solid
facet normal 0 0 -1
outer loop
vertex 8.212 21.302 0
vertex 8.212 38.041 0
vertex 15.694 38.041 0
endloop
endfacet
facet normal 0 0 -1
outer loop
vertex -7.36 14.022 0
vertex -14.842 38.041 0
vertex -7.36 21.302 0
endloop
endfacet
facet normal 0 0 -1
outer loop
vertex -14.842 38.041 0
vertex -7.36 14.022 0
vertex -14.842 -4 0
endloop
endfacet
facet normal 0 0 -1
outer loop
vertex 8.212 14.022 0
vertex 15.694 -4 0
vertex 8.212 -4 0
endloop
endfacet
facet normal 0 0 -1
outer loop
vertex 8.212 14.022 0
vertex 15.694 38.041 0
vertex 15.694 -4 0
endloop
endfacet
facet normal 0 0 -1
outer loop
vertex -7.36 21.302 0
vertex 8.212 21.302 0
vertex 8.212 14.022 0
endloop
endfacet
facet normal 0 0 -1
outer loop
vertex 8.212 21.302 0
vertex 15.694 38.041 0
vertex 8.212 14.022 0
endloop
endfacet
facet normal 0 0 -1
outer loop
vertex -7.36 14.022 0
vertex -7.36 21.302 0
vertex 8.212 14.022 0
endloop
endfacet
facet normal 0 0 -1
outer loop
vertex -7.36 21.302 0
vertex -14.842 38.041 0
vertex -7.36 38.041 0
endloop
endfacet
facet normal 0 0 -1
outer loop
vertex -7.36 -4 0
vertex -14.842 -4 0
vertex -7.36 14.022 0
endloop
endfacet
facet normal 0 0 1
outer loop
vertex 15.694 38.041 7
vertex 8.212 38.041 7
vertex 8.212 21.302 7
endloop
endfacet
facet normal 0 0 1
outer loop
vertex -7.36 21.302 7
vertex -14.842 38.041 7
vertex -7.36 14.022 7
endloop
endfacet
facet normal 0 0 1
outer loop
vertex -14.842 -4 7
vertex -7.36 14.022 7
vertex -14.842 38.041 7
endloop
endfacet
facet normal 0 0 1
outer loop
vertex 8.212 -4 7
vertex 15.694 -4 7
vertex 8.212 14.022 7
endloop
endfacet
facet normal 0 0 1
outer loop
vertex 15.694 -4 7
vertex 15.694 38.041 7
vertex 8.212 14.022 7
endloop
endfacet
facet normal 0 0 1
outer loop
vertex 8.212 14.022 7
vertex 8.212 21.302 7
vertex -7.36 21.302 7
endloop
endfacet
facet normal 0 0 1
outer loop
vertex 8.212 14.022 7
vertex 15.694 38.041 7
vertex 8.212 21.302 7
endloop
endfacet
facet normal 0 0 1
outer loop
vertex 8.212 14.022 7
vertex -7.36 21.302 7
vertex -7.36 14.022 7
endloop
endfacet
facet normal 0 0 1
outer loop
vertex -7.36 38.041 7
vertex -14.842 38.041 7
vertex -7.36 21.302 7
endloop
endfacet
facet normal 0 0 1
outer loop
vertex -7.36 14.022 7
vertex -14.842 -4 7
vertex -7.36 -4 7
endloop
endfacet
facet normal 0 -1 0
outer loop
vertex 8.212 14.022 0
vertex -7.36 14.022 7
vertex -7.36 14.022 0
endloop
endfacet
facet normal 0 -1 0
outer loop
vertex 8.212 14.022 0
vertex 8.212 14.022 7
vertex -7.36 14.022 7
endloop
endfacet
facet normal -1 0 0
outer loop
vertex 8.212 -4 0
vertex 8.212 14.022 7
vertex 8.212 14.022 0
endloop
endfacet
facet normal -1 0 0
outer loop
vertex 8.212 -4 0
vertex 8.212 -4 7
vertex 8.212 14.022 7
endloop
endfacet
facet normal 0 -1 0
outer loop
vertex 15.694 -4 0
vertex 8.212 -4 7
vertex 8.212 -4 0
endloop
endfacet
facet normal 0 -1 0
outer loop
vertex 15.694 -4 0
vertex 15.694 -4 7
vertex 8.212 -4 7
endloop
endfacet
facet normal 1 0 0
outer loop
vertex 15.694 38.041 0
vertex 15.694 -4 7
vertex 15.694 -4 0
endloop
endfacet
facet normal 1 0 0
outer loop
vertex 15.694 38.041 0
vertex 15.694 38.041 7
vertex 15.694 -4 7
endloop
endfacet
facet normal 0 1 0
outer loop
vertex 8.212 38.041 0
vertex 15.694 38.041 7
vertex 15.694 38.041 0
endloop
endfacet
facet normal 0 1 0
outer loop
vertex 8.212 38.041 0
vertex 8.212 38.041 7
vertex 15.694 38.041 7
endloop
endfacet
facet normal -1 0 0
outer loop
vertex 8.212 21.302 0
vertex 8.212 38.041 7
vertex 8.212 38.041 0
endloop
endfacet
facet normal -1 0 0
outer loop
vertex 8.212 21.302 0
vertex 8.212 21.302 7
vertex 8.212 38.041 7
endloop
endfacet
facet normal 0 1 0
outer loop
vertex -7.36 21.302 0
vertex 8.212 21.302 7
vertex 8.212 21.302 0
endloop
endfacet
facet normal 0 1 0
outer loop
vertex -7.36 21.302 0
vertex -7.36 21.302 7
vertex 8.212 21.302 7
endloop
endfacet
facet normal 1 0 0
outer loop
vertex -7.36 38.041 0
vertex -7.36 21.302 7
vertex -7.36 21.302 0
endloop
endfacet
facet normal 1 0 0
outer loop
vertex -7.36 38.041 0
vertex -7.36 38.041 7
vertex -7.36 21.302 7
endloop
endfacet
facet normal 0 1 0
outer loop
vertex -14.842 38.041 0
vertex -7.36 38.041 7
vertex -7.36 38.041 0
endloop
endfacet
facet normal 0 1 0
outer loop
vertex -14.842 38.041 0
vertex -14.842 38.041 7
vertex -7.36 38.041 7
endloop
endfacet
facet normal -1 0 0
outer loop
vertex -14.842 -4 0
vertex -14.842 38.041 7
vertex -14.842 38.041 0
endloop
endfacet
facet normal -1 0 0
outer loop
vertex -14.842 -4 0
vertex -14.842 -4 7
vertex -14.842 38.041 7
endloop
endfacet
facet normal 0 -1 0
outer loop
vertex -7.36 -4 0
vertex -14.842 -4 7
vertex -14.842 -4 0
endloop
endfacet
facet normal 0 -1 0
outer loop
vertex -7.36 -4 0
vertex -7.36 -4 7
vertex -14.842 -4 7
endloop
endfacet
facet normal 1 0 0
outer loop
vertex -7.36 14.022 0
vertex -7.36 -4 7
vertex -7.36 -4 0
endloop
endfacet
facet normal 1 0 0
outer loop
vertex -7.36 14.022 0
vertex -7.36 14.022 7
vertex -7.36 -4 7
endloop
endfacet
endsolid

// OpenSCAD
// file: glyph.scad
// glyph — the shared geometry of every letter in the set. Defines named geometry
// only, so it renders nothing on its own; each letter part includes it and calls
// letter(). Every dimension lives in ../../lib/common.scad.
//
// A LETTER IS NOTHING BUT A LETTER. No plinth, no tongue, no tab — it is the
// bare glyph, and it attaches by standing in the deck groove and resting on the
// groove's floor. Anything else on it would be a distraction on a learning toy.
//
// It is a flat plate of one thickness, printed face-down: no overhang anywhere,
// no supports, and the face on the bed comes out smoothest.
//
// TWO TRAPS WITH text():
//
//  * A missing font FALLS BACK SILENTLY — no warning, no error, just different
//    letters. "Liberation Sans" was the first choice here because OpenSCAD
//    bundles it; on macOS the bundled faces are not registered with fontconfig,
//    so it rendered the fallback face instead and nothing said so. To check a
//    font resolved, render a string with it and with a deliberately bogus name
//    and compare bounding boxes: identical means it fell back.
//  * `size` is not the cap height in general. For Helvetica Bold they coincide
//    (size 44 -> 44.0 mm cap), which is why letter_size reads as a height.
//    Change the font and re-measure.

include <../../lib/common.scad>

// The letter's outline, upright in the XY plane, ready to be extruded along Z
// (which is the letter's thickness, and the print's build axis).
//
//   y = 0   is the deck surface
//   y < 0   is the part standing down inside the groove. It reaches letter_bury,
//           which is where the tapered groove closes to letter_t — NOT the
//           groove's floor. The letter wedges; it never bottoms out.
module glyph_2d(ch) {
    intersection() {
        translate([0, -letter_bury])
            scale([letter_condense, 1])
                text(ch, size = letter_size, font = letter_font,
                     halign = "center", valign = "baseline");
        // Trimmed flat at the baseline. Round letters (O, C, G, S) overshoot the
        // baseline by design, and a letter standing on a convex curve rocks —
        // there is nothing to stop it leaning. The trim costs nothing visible
        // and gives every letter a flat foot on the groove floor.
        translate([-200, -letter_bury]) square([400, 400]);
    }
}

// One letter, in its print orientation: lying on its face, thickness up Z.
module letter(ch) {
    linear_extrude(letter_t) glyph_2d(ch);
}

// Where that letter sits once it is dropped into a chassis, for fit checks.
module letter_fitted(ch) {
    translate([0, letter_t/2, body_top]) rotate([90, 0, 0]) letter(ch);
}
// main file
// letter H — one part. See glyph.scad for the geometry and lib/common.scad for
// the dimensions. Prints lying on its face, exactly as exported: no supports.

include <glyph.scad>

letter("H");
